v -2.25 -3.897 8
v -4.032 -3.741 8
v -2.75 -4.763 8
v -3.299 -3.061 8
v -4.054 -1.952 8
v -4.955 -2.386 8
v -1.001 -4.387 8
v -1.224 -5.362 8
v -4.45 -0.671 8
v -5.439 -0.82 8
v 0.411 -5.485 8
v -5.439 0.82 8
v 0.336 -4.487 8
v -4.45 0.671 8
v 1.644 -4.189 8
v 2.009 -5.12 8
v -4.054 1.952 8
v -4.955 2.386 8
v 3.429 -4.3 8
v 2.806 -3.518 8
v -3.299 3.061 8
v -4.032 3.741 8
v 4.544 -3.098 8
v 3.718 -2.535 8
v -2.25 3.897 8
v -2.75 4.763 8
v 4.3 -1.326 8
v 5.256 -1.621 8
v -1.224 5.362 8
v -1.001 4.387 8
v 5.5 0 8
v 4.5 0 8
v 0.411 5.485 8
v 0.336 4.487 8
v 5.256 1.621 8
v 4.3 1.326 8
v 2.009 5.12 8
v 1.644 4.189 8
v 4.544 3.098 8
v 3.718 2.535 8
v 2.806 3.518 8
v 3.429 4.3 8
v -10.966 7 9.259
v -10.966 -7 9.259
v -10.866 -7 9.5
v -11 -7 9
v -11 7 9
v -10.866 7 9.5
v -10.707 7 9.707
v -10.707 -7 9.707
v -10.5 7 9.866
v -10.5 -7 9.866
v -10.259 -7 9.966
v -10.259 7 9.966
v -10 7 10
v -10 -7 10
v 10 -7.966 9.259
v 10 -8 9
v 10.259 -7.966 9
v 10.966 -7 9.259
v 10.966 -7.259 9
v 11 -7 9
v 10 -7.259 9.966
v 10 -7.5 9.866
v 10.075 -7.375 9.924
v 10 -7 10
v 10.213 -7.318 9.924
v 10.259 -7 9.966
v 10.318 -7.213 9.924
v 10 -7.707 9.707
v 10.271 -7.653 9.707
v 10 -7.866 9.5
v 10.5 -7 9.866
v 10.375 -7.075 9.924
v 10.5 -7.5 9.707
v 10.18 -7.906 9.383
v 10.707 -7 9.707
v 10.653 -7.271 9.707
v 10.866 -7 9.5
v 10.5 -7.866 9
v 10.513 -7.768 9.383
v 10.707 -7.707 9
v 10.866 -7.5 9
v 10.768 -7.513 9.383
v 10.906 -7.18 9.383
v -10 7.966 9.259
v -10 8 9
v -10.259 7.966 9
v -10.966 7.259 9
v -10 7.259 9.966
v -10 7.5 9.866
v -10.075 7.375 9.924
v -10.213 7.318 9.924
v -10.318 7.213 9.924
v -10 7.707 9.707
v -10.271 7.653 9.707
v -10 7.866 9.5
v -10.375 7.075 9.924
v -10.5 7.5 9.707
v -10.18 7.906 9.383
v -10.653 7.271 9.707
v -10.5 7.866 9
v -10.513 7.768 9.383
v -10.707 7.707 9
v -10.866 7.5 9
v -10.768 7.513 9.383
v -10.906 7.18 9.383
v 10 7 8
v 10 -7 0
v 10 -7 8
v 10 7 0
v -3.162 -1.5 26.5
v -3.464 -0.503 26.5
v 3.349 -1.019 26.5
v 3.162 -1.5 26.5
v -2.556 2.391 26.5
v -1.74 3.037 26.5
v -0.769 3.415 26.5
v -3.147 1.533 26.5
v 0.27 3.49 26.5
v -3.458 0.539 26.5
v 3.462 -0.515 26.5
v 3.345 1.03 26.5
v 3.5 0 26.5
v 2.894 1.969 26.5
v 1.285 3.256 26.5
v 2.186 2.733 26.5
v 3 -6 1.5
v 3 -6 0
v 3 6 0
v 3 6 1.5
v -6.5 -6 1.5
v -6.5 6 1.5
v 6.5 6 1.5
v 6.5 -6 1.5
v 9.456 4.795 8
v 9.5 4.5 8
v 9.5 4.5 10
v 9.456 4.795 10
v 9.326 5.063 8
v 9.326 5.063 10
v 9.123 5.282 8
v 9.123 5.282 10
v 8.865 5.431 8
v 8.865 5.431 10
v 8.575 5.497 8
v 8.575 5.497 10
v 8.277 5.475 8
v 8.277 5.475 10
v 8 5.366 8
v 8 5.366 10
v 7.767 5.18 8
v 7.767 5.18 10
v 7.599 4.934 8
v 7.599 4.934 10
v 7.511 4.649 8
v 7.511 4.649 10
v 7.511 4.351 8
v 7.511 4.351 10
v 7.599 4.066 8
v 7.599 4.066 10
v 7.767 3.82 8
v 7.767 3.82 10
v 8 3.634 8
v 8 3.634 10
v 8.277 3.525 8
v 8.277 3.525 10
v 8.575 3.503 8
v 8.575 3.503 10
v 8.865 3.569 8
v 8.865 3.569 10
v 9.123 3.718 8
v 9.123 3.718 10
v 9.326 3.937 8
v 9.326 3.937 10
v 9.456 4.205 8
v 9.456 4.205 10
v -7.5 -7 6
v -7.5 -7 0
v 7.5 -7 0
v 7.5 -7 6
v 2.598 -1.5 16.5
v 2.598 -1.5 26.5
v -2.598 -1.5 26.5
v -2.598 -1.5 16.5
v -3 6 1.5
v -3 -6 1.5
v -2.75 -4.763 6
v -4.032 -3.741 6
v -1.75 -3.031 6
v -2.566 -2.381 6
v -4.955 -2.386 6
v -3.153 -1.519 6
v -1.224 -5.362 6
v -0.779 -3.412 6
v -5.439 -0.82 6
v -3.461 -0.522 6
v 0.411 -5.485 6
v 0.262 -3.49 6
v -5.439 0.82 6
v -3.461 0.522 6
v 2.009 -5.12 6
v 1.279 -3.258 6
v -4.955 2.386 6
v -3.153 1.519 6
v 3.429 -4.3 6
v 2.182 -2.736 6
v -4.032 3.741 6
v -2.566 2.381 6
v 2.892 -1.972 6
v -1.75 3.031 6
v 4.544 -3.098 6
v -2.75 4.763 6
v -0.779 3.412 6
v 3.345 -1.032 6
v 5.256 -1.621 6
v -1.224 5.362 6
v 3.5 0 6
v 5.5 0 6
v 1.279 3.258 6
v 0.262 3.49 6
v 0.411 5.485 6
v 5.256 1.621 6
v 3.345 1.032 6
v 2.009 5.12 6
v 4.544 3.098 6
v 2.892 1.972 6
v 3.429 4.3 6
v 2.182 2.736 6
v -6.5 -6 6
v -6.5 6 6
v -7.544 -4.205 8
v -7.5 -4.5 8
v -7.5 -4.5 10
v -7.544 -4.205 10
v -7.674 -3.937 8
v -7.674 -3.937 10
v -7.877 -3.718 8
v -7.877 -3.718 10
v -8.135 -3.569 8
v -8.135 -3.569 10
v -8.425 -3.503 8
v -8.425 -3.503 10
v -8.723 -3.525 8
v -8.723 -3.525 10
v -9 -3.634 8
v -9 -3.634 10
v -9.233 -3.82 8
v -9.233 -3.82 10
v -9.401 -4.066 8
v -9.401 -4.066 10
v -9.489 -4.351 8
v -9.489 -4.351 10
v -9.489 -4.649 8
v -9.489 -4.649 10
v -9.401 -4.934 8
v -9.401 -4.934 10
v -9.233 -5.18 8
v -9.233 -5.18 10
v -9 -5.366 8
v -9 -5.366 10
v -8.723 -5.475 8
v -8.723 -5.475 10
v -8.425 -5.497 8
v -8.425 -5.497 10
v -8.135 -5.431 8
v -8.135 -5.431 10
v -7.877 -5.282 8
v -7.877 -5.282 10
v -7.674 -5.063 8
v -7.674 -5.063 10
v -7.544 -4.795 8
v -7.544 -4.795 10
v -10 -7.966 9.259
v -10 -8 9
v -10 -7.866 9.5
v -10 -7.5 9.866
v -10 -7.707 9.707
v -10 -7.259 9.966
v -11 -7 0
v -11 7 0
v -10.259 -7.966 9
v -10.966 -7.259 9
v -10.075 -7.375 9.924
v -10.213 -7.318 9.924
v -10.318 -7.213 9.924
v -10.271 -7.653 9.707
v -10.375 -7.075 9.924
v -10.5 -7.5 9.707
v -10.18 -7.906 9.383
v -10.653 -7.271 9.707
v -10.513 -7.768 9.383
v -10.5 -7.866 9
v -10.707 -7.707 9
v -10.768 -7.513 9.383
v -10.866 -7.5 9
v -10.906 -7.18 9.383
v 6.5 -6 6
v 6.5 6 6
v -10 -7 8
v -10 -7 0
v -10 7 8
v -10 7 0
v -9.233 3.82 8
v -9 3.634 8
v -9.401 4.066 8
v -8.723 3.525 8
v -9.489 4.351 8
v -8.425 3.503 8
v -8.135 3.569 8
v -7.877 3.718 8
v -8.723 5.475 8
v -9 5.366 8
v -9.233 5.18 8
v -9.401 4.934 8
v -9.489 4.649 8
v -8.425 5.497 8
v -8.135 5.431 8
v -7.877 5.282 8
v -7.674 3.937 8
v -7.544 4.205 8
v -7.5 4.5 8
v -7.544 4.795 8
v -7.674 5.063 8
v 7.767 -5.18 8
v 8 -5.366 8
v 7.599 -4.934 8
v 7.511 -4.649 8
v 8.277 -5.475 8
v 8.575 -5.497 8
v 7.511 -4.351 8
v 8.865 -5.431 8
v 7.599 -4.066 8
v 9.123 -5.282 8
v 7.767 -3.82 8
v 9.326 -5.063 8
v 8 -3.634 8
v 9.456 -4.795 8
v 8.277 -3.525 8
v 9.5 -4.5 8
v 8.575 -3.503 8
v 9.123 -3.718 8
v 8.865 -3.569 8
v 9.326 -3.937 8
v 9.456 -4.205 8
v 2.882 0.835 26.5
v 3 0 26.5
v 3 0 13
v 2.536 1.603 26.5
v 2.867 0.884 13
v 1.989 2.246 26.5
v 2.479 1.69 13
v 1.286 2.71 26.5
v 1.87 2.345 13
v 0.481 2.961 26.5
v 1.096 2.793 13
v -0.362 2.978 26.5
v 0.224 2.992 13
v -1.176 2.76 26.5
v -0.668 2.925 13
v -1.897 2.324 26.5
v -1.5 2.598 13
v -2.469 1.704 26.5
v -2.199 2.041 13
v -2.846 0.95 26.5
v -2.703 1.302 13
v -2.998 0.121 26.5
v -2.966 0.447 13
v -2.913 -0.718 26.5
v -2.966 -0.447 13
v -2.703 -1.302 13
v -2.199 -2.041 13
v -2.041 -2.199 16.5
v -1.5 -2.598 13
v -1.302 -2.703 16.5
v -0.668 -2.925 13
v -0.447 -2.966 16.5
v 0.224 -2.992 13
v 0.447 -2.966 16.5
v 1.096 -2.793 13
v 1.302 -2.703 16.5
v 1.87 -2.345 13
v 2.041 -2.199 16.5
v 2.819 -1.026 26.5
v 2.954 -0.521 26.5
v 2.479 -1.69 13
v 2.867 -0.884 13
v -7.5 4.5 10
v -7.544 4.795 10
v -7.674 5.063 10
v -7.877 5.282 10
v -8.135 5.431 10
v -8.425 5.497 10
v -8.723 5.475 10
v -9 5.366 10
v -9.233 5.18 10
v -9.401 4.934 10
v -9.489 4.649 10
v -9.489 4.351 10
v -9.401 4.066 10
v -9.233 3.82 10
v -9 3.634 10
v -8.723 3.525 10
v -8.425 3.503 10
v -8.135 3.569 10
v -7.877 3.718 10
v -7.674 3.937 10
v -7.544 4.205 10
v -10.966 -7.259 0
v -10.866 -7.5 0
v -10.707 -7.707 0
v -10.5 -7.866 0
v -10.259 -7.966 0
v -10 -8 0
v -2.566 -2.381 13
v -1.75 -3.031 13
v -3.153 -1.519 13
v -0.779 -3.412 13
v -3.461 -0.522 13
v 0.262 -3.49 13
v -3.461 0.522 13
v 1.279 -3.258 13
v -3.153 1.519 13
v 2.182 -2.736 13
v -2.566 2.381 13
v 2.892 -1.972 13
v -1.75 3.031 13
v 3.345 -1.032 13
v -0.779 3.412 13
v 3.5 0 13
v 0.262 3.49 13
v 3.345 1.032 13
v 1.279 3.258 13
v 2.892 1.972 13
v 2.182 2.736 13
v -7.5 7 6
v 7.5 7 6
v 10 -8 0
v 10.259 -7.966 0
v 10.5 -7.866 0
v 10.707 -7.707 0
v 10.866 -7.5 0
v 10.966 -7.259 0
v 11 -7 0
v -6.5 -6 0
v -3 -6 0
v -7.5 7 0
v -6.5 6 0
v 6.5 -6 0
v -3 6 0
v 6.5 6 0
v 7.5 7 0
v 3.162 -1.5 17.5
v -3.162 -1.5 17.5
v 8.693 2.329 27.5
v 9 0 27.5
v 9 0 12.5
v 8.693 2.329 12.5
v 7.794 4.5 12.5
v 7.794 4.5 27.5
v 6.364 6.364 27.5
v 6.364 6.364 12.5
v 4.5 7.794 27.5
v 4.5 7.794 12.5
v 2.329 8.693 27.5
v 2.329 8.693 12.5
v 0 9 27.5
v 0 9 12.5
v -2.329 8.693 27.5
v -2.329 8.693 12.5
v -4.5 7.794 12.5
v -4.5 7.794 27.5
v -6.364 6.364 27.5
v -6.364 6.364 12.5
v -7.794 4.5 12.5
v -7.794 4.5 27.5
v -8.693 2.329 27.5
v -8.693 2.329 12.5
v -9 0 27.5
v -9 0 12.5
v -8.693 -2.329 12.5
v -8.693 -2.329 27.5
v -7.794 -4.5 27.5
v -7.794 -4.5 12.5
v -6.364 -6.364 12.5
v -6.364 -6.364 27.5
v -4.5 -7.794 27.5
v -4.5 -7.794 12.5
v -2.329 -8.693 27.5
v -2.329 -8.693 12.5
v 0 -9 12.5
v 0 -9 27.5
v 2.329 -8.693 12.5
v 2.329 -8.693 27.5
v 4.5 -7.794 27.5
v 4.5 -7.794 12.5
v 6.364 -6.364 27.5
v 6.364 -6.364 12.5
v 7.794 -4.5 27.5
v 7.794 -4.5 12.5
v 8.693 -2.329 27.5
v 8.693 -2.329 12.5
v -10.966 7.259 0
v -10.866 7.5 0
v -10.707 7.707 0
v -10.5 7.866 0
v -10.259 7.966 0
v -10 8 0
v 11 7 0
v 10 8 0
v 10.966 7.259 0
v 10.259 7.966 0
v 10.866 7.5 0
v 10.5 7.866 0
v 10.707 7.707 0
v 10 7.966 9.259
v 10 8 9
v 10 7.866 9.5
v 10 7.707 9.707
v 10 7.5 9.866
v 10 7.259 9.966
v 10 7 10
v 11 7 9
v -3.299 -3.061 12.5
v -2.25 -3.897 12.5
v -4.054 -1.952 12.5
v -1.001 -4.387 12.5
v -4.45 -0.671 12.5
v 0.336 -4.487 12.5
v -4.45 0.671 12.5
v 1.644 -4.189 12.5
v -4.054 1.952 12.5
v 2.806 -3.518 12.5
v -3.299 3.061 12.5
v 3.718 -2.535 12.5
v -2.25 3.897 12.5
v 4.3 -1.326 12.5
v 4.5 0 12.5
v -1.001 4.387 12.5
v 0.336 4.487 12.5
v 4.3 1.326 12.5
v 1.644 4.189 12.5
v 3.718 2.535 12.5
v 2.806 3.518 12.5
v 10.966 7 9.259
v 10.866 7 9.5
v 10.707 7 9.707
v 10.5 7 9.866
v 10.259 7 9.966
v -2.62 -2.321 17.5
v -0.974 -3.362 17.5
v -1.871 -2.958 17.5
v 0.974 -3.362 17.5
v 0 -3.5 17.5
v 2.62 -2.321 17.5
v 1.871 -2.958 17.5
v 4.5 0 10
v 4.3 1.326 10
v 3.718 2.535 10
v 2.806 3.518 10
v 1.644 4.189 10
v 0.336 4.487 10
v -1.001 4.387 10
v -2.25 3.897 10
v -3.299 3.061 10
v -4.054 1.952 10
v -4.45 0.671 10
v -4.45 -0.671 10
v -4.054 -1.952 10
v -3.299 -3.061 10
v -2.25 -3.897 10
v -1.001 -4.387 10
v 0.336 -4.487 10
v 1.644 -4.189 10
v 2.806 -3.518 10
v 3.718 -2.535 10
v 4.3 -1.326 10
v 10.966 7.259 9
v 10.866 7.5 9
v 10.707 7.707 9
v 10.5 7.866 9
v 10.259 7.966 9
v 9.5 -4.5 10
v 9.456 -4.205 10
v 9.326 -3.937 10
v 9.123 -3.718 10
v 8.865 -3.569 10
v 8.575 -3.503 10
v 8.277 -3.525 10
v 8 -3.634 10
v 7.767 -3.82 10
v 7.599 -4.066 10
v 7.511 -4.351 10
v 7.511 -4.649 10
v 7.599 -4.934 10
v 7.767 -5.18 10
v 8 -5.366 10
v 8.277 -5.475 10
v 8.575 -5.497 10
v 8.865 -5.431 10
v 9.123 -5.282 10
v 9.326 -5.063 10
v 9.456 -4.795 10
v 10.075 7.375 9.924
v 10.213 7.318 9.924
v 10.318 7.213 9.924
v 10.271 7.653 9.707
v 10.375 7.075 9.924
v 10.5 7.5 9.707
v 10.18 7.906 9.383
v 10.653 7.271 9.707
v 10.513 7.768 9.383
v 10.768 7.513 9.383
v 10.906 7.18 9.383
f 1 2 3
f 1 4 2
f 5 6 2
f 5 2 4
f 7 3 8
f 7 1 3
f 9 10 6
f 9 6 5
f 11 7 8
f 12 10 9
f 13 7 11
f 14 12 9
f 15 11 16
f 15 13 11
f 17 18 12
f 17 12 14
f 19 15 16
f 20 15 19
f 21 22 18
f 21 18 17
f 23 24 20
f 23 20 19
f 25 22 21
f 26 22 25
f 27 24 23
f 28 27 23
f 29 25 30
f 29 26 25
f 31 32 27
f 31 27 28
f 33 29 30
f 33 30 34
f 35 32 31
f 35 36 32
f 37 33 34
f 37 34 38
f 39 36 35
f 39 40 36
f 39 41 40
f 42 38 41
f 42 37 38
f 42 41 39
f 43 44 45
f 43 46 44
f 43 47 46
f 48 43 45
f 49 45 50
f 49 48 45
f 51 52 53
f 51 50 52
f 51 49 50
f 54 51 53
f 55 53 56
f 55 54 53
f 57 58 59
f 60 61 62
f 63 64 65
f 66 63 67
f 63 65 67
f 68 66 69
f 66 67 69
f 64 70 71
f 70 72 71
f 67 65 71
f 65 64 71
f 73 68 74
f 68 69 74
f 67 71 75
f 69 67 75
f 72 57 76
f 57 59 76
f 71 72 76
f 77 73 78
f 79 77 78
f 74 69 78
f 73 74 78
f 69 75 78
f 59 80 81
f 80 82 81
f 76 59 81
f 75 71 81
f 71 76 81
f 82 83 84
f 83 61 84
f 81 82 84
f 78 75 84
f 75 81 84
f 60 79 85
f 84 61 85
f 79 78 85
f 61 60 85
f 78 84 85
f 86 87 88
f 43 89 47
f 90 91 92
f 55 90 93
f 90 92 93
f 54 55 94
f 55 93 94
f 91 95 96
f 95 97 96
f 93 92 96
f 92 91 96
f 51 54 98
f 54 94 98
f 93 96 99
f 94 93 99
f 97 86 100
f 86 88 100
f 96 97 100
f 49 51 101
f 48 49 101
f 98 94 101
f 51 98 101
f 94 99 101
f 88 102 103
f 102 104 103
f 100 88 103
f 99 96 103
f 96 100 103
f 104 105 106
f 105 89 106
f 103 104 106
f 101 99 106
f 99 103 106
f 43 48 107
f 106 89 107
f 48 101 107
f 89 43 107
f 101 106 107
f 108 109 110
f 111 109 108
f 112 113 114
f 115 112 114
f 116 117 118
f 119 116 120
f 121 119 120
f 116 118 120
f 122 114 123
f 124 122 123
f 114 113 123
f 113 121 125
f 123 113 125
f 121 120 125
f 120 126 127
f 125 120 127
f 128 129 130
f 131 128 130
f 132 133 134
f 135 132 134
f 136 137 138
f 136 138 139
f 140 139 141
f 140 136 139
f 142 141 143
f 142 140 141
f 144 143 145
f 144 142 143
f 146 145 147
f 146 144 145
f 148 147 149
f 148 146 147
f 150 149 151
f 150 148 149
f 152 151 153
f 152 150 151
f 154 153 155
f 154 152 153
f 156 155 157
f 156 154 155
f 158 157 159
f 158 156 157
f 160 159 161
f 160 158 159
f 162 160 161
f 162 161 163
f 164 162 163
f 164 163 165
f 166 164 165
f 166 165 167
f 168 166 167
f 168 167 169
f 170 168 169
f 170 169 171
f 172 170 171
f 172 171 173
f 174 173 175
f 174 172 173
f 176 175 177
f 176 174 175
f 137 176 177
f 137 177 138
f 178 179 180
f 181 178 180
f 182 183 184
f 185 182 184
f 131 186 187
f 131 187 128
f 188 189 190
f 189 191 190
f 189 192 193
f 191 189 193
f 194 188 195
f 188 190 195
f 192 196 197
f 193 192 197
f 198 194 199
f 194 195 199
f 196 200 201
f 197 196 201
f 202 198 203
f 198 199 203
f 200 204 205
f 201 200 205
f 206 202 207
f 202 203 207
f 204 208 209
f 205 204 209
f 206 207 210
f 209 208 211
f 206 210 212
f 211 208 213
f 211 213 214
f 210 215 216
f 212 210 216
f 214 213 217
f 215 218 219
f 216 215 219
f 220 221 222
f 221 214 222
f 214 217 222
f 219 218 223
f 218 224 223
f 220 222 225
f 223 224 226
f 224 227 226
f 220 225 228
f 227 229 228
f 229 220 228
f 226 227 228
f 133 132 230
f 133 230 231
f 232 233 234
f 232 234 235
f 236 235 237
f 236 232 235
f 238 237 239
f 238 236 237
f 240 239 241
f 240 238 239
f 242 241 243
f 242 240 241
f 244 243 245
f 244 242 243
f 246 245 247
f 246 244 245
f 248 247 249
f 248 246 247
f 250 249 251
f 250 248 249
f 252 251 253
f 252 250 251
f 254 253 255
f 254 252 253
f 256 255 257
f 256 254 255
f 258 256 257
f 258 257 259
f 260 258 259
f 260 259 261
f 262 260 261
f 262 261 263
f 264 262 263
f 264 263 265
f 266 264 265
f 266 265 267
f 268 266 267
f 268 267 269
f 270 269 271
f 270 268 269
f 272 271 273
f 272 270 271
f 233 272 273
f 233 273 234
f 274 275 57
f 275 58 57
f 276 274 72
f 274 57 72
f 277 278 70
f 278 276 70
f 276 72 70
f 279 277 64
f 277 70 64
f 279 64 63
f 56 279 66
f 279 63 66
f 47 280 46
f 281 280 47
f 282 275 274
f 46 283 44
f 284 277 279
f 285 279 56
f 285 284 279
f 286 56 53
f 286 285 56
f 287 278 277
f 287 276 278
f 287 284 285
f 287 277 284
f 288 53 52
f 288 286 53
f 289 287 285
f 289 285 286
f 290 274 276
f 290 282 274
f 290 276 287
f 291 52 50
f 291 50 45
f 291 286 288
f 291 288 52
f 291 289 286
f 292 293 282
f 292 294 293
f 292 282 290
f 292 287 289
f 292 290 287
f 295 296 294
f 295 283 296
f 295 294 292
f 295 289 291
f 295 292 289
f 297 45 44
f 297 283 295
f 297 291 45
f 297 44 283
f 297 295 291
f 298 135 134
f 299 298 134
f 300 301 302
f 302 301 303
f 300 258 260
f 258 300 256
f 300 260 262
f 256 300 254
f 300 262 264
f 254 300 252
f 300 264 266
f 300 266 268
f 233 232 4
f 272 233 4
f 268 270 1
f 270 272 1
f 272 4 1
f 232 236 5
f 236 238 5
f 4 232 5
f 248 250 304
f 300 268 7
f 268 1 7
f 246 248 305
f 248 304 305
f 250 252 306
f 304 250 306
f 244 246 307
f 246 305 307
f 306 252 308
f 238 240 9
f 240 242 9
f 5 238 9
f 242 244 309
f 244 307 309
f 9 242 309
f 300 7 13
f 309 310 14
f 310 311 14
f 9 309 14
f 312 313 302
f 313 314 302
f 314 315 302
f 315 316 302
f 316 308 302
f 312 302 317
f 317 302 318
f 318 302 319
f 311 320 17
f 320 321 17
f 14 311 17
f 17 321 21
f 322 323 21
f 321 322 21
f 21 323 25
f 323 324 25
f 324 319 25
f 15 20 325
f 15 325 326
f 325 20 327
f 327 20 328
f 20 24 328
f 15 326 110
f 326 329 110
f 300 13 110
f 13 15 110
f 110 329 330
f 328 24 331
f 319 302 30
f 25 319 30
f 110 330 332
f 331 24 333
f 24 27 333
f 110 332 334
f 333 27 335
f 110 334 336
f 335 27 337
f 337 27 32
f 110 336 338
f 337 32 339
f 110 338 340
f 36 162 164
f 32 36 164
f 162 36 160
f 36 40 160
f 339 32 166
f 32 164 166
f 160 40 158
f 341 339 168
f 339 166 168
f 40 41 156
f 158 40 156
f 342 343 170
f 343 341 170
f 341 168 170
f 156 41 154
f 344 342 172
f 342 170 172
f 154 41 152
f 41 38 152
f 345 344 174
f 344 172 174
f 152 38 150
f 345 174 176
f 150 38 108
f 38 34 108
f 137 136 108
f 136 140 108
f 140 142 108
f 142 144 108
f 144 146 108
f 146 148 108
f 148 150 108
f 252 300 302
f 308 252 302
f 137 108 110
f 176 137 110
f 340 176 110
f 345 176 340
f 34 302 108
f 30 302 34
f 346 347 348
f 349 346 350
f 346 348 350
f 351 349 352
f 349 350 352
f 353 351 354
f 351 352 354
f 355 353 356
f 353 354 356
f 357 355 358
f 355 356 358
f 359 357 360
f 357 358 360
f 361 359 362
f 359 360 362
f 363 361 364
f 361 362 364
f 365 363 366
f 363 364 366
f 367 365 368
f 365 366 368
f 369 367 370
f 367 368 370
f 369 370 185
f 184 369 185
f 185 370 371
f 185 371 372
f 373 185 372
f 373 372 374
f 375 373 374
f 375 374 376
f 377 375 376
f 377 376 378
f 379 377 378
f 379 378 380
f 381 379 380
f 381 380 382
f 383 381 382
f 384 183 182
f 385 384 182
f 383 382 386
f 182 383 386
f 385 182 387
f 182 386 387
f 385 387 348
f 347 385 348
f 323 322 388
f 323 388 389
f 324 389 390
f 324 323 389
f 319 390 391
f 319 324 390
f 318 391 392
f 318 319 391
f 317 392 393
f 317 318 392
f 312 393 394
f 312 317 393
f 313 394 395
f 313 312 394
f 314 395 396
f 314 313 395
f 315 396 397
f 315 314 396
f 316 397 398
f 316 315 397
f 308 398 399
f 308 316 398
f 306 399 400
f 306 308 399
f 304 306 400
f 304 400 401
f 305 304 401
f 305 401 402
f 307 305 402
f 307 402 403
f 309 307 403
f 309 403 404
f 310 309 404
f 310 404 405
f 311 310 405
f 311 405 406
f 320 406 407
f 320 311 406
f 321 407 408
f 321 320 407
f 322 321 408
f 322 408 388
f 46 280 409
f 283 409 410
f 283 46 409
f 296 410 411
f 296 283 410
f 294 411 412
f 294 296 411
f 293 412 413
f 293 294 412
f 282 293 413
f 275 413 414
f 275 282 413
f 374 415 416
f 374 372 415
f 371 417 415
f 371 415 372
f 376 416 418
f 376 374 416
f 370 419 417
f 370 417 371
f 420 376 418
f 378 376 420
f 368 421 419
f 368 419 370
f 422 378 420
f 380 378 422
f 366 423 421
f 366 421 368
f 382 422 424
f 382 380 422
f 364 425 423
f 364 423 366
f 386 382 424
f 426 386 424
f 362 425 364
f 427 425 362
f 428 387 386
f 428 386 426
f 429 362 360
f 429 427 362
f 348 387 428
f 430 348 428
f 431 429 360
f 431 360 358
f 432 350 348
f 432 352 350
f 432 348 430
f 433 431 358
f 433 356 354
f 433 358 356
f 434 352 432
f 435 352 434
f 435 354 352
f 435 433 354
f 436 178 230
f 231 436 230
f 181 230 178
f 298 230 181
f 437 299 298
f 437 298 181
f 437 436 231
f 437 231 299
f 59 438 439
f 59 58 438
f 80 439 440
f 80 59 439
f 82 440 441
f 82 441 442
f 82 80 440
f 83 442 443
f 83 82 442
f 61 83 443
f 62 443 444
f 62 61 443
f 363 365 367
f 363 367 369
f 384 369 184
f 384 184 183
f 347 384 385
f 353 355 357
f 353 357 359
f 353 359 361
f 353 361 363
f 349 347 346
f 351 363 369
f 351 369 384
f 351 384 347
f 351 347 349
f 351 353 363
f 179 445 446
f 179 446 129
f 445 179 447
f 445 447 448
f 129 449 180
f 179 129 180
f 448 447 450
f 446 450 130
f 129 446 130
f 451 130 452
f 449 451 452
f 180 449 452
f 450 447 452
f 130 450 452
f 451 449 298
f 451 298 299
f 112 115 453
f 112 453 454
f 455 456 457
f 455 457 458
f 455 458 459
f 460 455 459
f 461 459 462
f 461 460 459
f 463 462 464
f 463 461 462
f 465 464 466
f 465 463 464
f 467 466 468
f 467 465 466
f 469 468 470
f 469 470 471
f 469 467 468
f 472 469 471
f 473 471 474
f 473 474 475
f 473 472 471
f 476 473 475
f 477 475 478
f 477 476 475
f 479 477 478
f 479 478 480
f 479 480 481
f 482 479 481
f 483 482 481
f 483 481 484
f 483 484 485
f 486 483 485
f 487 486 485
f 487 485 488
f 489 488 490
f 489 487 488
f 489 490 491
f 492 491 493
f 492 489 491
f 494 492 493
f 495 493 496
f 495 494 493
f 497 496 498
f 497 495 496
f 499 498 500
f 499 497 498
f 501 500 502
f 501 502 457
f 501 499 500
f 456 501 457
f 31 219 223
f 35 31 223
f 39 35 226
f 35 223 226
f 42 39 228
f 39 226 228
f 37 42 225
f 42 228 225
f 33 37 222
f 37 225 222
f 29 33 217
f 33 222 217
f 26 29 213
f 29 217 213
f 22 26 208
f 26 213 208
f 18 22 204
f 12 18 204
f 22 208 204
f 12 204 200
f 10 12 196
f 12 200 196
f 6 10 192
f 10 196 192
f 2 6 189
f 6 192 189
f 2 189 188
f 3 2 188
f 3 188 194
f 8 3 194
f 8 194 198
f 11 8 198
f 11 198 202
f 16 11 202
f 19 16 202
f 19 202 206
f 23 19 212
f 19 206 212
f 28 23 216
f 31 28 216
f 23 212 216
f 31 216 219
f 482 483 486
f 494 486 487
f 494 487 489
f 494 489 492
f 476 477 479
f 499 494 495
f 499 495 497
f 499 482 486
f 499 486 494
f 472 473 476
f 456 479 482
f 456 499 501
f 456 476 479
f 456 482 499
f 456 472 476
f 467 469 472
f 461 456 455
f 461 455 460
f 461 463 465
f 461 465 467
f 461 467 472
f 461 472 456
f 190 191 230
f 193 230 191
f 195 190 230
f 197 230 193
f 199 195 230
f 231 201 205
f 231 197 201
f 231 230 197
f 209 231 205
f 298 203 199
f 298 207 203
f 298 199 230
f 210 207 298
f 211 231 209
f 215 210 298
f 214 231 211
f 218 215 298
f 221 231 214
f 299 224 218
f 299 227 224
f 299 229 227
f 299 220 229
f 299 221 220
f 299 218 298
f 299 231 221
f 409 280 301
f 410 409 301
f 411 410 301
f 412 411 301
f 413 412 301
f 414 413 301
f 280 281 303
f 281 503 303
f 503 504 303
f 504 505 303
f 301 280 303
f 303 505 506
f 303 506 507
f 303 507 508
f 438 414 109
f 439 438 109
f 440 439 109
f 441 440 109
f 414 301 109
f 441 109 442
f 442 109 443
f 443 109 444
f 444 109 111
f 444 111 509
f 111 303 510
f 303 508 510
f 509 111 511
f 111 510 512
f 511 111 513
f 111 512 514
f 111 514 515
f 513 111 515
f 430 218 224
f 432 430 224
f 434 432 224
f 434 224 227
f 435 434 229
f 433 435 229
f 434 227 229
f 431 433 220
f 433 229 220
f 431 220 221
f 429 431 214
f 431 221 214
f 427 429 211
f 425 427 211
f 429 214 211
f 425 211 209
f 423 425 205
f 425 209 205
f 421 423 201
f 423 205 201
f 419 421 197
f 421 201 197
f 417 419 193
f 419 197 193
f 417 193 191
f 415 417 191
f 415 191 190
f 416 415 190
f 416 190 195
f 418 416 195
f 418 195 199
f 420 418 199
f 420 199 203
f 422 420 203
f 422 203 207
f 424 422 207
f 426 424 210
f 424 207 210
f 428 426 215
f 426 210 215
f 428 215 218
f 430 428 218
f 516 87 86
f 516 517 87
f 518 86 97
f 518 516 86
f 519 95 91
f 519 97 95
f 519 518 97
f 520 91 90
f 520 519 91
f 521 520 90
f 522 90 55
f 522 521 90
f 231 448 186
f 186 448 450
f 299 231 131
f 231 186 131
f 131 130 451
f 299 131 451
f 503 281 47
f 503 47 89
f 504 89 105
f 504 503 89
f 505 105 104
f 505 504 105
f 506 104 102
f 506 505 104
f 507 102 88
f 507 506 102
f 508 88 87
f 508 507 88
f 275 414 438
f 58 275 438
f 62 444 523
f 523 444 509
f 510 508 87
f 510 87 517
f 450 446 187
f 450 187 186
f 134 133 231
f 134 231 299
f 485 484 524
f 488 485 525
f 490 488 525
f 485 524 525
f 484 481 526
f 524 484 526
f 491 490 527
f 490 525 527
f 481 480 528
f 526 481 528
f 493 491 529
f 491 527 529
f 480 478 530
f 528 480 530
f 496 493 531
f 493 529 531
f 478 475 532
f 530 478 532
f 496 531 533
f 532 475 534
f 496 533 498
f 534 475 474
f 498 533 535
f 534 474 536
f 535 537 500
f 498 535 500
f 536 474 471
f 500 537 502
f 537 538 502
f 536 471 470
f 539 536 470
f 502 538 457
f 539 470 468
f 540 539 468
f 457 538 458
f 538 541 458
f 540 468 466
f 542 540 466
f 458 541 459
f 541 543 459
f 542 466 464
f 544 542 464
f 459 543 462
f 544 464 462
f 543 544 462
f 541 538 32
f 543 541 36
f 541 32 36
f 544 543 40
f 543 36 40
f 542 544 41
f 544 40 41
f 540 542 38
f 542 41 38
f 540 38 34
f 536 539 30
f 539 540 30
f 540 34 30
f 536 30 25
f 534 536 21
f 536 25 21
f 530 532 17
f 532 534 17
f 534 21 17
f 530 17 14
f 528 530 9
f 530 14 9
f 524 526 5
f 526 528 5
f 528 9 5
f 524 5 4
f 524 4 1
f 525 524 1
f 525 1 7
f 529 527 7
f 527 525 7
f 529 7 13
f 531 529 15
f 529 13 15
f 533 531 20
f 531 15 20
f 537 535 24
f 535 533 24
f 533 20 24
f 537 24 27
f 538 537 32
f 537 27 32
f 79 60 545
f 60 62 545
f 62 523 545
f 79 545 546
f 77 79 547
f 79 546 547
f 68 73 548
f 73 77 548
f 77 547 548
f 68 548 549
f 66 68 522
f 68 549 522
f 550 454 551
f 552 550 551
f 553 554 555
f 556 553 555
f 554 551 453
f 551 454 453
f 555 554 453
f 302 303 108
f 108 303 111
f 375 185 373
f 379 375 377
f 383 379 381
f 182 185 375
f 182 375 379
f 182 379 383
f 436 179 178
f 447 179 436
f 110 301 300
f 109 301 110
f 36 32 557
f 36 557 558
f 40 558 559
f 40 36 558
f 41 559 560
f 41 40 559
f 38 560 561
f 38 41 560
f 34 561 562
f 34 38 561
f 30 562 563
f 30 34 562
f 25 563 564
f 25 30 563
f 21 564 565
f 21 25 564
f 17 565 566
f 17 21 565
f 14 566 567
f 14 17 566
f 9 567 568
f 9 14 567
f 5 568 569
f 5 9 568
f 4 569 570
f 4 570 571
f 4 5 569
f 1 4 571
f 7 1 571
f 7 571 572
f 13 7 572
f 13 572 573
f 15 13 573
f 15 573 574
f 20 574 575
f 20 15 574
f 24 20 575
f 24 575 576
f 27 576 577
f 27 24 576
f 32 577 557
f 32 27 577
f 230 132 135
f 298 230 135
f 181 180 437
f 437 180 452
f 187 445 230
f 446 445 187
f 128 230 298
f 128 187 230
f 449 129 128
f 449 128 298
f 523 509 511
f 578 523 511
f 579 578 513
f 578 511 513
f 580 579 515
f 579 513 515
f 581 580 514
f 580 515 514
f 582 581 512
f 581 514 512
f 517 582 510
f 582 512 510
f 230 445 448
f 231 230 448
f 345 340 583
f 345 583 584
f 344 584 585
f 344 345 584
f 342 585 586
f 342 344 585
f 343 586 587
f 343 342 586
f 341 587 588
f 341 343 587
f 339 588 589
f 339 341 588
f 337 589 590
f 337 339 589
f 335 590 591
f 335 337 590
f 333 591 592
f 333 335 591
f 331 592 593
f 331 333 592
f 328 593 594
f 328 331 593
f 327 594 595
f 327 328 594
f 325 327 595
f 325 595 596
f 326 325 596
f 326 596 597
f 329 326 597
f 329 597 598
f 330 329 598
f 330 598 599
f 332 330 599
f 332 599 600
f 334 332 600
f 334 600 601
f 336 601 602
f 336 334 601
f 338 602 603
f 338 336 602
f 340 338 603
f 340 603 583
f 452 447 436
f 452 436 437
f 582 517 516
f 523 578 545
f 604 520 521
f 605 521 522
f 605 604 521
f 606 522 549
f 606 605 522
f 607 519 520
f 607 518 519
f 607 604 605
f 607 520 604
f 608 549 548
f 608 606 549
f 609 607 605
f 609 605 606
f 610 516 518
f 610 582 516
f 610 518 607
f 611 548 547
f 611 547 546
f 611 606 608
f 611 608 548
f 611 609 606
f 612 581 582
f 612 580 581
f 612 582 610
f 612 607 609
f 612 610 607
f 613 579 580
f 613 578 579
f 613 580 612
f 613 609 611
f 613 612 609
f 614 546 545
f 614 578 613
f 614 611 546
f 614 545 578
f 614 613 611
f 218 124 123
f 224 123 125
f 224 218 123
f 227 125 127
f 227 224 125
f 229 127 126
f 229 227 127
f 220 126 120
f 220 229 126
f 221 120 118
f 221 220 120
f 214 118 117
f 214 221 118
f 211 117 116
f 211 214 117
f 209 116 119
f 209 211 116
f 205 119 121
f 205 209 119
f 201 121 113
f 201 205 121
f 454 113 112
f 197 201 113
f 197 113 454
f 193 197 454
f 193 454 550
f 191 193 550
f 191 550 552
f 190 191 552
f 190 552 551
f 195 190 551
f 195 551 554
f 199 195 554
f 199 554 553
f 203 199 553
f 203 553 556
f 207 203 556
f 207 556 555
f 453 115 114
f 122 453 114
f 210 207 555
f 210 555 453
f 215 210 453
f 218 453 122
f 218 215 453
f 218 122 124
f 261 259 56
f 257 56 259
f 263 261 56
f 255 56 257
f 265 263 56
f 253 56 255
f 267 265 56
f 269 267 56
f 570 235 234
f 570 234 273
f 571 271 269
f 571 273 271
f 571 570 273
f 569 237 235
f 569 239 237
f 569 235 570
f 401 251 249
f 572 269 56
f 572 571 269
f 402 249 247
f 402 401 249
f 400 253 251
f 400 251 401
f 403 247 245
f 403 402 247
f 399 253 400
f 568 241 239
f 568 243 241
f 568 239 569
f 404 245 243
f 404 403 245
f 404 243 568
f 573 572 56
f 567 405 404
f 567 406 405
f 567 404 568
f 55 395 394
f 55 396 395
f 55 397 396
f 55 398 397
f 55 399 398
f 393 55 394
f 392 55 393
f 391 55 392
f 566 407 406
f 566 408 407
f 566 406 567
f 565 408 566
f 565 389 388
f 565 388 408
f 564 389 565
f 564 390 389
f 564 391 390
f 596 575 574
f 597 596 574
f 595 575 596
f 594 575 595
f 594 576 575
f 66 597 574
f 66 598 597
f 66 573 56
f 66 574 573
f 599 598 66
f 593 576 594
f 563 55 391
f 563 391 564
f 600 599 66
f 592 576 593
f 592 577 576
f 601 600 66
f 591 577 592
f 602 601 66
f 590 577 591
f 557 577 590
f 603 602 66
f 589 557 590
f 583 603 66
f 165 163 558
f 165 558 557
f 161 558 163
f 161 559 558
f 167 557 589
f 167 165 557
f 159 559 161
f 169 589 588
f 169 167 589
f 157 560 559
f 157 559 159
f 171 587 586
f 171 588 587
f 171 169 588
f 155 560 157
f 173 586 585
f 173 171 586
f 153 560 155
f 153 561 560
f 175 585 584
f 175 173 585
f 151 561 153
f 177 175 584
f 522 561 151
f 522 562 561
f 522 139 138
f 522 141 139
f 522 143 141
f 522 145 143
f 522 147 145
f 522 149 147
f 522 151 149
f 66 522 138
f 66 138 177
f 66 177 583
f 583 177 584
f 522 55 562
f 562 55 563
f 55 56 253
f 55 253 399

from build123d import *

# Parameters (mm, degrees)
F0_W      = 15
F0_H      = 14
F0_W_2    = 13
F0_H_2    = 12
F1_DEPTH  = 6
F2_W      = 6
F2_H      = 12
F3_DEPTH  = 1.5
F4_W      = 13
F4_H      = 12
F5_DEPTH  = 4.5
F6_R      = 3.5
F7_DEPTH  = 7
F8_R      = 3
F9_DEPTH  = 13.5
F11_DEPTH = 10
F12_W     = 22
F12_H     = 16
F12_W_2   = 20
F12_H_2   = 14
F13_DEPTH = 8
F14_W     = 22
F14_H     = 16
F14_R     = 1
F14_R_2   = 4.5
F15_DEPTH = 2
F16_R     = 1
F18_R     = 5.5
F18_R_2   = 3.5
F19_DEPTH = 2
F20_R     = 4.5
F20_R_2   = 3.5
F21_DEPTH = 18.5
F23_DEPTH = 9
F24_R     = 4.5
F25_DEPTH = 1
F26_R     = 9
F26_R_2   = 3.5
F27_DEPTH = 15


with BuildPart() as f1:
    # F0 (on Top) → F1 (new body)
    with BuildSketch(Plane.XY):
        Rectangle(F0_W, F0_H)
        Rectangle(F0_W_2, F0_H_2, mode=Mode.SUBTRACT)
    extrude(amount=F1_DEPTH)

    # F2 (on Top) → F3 (join)
    with BuildSketch(Plane.XY):
        Rectangle(F2_W, F2_H)
    extrude(amount=F3_DEPTH)


with BuildPart() as f5:
    # F4 (on face) → F5 (new body)
    with BuildSketch(Plane.XY.offset(1.5)):
        Rectangle(F4_W, F4_H)
    extrude(amount=F5_DEPTH)

    # F6 (on face) → F7 (join)
    with BuildSketch(Plane.XY.offset(6)):
        Circle(F6_R)
    extrude(amount=F7_DEPTH)

    # F8 (on face) → F9 (join)
    with BuildSketch(Plane.XY.offset(13)):
        Circle(F8_R)
    extrude(amount=F9_DEPTH)

    # F10 (on face) → F11 (cut)
    with BuildSketch(Plane.XY.offset(26.5)):
        with BuildLine():
            Line((2.5980762114, -1.5), (-2.5980762114, -1.5))
            ThreePointArc((-2.5980762114, -1.5), (0, -3), (2.5980762114, -1.5))
        make_face()
    extrude(amount=-F11_DEPTH, mode=Mode.SUBTRACT)


with BuildPart() as f13:
    # F12 (on Top) → F13 (new body)
    with BuildSketch(Plane.XY):
        Rectangle(F12_W, F12_H)
        Rectangle(F12_W_2, F12_H_2, mode=Mode.SUBTRACT)
    extrude(amount=F13_DEPTH)

    # F14 (on face) → F15 (join)
    with BuildSketch(Plane.XY.offset(8)):
        Rectangle(F14_W, F14_H)
        with Locations((-8.5, -4.5)):
            Circle(F14_R, mode=Mode.SUBTRACT)
        with Locations((8.5, -4.5)):
            Circle(F14_R, mode=Mode.SUBTRACT)
        with Locations((-8.5, 4.5)):
            Circle(F14_R, mode=Mode.SUBTRACT)
        Circle(F14_R_2, mode=Mode.SUBTRACT)
        with Locations((8.5, 4.5)):
            Circle(F14_R, mode=Mode.SUBTRACT)
    extrude(amount=F15_DEPTH)

    # F16
    f16_edges = [f13.edges().sort_by_distance(p)[0] for p in [
        (-11, -8, 5),
        (11, -8, 5),
        (11, 8, 5),
        (-11, 8, 5),
        (0, -8, 10),
        (0, 8, 10),
        (-11, 0, 10),
        (11, 0, 10),
    ]]
    fillet(f16_edges, radius=F16_R)


with BuildPart() as f19:
    # F18 (on offset) → F19 (new body)
    with BuildSketch(Plane.XY.offset(6)):
        Circle(F18_R)
        Circle(F18_R_2, mode=Mode.SUBTRACT)
    extrude(amount=F19_DEPTH)

    # F20 (on face) → F21 (join)
    with BuildSketch(Plane.XY.offset(8)):
        Circle(F20_R)
        Circle(F20_R_2, mode=Mode.SUBTRACT)
    extrude(amount=F21_DEPTH)

    # F22 (on face) → F23 (join)
    with BuildSketch(Plane.XY.offset(26.5)):
        with BuildLine():
            Line((3.1622776602, -1.5), (-3.1622776602, -1.5))
            ThreePointArc((-3.1622776602, -1.5), (0, -3.5), (3.1622776602, -1.5))
        make_face()
    extrude(amount=-F23_DEPTH)

    # F24 (on face) → F25 (join)
    with BuildSketch(Plane.XY.offset(26.5)):
        Circle(F24_R)
    extrude(amount=F25_DEPTH)

    # F26 (on face) → F27 (join)
    with BuildSketch(Plane.XY.offset(27.5)):
        Circle(F26_R)
        Circle(F26_R_2, mode=Mode.SUBTRACT)
    extrude(amount=-F27_DEPTH)


solid = Compound([f1.part, f5.part, f13.part, f19.part])
